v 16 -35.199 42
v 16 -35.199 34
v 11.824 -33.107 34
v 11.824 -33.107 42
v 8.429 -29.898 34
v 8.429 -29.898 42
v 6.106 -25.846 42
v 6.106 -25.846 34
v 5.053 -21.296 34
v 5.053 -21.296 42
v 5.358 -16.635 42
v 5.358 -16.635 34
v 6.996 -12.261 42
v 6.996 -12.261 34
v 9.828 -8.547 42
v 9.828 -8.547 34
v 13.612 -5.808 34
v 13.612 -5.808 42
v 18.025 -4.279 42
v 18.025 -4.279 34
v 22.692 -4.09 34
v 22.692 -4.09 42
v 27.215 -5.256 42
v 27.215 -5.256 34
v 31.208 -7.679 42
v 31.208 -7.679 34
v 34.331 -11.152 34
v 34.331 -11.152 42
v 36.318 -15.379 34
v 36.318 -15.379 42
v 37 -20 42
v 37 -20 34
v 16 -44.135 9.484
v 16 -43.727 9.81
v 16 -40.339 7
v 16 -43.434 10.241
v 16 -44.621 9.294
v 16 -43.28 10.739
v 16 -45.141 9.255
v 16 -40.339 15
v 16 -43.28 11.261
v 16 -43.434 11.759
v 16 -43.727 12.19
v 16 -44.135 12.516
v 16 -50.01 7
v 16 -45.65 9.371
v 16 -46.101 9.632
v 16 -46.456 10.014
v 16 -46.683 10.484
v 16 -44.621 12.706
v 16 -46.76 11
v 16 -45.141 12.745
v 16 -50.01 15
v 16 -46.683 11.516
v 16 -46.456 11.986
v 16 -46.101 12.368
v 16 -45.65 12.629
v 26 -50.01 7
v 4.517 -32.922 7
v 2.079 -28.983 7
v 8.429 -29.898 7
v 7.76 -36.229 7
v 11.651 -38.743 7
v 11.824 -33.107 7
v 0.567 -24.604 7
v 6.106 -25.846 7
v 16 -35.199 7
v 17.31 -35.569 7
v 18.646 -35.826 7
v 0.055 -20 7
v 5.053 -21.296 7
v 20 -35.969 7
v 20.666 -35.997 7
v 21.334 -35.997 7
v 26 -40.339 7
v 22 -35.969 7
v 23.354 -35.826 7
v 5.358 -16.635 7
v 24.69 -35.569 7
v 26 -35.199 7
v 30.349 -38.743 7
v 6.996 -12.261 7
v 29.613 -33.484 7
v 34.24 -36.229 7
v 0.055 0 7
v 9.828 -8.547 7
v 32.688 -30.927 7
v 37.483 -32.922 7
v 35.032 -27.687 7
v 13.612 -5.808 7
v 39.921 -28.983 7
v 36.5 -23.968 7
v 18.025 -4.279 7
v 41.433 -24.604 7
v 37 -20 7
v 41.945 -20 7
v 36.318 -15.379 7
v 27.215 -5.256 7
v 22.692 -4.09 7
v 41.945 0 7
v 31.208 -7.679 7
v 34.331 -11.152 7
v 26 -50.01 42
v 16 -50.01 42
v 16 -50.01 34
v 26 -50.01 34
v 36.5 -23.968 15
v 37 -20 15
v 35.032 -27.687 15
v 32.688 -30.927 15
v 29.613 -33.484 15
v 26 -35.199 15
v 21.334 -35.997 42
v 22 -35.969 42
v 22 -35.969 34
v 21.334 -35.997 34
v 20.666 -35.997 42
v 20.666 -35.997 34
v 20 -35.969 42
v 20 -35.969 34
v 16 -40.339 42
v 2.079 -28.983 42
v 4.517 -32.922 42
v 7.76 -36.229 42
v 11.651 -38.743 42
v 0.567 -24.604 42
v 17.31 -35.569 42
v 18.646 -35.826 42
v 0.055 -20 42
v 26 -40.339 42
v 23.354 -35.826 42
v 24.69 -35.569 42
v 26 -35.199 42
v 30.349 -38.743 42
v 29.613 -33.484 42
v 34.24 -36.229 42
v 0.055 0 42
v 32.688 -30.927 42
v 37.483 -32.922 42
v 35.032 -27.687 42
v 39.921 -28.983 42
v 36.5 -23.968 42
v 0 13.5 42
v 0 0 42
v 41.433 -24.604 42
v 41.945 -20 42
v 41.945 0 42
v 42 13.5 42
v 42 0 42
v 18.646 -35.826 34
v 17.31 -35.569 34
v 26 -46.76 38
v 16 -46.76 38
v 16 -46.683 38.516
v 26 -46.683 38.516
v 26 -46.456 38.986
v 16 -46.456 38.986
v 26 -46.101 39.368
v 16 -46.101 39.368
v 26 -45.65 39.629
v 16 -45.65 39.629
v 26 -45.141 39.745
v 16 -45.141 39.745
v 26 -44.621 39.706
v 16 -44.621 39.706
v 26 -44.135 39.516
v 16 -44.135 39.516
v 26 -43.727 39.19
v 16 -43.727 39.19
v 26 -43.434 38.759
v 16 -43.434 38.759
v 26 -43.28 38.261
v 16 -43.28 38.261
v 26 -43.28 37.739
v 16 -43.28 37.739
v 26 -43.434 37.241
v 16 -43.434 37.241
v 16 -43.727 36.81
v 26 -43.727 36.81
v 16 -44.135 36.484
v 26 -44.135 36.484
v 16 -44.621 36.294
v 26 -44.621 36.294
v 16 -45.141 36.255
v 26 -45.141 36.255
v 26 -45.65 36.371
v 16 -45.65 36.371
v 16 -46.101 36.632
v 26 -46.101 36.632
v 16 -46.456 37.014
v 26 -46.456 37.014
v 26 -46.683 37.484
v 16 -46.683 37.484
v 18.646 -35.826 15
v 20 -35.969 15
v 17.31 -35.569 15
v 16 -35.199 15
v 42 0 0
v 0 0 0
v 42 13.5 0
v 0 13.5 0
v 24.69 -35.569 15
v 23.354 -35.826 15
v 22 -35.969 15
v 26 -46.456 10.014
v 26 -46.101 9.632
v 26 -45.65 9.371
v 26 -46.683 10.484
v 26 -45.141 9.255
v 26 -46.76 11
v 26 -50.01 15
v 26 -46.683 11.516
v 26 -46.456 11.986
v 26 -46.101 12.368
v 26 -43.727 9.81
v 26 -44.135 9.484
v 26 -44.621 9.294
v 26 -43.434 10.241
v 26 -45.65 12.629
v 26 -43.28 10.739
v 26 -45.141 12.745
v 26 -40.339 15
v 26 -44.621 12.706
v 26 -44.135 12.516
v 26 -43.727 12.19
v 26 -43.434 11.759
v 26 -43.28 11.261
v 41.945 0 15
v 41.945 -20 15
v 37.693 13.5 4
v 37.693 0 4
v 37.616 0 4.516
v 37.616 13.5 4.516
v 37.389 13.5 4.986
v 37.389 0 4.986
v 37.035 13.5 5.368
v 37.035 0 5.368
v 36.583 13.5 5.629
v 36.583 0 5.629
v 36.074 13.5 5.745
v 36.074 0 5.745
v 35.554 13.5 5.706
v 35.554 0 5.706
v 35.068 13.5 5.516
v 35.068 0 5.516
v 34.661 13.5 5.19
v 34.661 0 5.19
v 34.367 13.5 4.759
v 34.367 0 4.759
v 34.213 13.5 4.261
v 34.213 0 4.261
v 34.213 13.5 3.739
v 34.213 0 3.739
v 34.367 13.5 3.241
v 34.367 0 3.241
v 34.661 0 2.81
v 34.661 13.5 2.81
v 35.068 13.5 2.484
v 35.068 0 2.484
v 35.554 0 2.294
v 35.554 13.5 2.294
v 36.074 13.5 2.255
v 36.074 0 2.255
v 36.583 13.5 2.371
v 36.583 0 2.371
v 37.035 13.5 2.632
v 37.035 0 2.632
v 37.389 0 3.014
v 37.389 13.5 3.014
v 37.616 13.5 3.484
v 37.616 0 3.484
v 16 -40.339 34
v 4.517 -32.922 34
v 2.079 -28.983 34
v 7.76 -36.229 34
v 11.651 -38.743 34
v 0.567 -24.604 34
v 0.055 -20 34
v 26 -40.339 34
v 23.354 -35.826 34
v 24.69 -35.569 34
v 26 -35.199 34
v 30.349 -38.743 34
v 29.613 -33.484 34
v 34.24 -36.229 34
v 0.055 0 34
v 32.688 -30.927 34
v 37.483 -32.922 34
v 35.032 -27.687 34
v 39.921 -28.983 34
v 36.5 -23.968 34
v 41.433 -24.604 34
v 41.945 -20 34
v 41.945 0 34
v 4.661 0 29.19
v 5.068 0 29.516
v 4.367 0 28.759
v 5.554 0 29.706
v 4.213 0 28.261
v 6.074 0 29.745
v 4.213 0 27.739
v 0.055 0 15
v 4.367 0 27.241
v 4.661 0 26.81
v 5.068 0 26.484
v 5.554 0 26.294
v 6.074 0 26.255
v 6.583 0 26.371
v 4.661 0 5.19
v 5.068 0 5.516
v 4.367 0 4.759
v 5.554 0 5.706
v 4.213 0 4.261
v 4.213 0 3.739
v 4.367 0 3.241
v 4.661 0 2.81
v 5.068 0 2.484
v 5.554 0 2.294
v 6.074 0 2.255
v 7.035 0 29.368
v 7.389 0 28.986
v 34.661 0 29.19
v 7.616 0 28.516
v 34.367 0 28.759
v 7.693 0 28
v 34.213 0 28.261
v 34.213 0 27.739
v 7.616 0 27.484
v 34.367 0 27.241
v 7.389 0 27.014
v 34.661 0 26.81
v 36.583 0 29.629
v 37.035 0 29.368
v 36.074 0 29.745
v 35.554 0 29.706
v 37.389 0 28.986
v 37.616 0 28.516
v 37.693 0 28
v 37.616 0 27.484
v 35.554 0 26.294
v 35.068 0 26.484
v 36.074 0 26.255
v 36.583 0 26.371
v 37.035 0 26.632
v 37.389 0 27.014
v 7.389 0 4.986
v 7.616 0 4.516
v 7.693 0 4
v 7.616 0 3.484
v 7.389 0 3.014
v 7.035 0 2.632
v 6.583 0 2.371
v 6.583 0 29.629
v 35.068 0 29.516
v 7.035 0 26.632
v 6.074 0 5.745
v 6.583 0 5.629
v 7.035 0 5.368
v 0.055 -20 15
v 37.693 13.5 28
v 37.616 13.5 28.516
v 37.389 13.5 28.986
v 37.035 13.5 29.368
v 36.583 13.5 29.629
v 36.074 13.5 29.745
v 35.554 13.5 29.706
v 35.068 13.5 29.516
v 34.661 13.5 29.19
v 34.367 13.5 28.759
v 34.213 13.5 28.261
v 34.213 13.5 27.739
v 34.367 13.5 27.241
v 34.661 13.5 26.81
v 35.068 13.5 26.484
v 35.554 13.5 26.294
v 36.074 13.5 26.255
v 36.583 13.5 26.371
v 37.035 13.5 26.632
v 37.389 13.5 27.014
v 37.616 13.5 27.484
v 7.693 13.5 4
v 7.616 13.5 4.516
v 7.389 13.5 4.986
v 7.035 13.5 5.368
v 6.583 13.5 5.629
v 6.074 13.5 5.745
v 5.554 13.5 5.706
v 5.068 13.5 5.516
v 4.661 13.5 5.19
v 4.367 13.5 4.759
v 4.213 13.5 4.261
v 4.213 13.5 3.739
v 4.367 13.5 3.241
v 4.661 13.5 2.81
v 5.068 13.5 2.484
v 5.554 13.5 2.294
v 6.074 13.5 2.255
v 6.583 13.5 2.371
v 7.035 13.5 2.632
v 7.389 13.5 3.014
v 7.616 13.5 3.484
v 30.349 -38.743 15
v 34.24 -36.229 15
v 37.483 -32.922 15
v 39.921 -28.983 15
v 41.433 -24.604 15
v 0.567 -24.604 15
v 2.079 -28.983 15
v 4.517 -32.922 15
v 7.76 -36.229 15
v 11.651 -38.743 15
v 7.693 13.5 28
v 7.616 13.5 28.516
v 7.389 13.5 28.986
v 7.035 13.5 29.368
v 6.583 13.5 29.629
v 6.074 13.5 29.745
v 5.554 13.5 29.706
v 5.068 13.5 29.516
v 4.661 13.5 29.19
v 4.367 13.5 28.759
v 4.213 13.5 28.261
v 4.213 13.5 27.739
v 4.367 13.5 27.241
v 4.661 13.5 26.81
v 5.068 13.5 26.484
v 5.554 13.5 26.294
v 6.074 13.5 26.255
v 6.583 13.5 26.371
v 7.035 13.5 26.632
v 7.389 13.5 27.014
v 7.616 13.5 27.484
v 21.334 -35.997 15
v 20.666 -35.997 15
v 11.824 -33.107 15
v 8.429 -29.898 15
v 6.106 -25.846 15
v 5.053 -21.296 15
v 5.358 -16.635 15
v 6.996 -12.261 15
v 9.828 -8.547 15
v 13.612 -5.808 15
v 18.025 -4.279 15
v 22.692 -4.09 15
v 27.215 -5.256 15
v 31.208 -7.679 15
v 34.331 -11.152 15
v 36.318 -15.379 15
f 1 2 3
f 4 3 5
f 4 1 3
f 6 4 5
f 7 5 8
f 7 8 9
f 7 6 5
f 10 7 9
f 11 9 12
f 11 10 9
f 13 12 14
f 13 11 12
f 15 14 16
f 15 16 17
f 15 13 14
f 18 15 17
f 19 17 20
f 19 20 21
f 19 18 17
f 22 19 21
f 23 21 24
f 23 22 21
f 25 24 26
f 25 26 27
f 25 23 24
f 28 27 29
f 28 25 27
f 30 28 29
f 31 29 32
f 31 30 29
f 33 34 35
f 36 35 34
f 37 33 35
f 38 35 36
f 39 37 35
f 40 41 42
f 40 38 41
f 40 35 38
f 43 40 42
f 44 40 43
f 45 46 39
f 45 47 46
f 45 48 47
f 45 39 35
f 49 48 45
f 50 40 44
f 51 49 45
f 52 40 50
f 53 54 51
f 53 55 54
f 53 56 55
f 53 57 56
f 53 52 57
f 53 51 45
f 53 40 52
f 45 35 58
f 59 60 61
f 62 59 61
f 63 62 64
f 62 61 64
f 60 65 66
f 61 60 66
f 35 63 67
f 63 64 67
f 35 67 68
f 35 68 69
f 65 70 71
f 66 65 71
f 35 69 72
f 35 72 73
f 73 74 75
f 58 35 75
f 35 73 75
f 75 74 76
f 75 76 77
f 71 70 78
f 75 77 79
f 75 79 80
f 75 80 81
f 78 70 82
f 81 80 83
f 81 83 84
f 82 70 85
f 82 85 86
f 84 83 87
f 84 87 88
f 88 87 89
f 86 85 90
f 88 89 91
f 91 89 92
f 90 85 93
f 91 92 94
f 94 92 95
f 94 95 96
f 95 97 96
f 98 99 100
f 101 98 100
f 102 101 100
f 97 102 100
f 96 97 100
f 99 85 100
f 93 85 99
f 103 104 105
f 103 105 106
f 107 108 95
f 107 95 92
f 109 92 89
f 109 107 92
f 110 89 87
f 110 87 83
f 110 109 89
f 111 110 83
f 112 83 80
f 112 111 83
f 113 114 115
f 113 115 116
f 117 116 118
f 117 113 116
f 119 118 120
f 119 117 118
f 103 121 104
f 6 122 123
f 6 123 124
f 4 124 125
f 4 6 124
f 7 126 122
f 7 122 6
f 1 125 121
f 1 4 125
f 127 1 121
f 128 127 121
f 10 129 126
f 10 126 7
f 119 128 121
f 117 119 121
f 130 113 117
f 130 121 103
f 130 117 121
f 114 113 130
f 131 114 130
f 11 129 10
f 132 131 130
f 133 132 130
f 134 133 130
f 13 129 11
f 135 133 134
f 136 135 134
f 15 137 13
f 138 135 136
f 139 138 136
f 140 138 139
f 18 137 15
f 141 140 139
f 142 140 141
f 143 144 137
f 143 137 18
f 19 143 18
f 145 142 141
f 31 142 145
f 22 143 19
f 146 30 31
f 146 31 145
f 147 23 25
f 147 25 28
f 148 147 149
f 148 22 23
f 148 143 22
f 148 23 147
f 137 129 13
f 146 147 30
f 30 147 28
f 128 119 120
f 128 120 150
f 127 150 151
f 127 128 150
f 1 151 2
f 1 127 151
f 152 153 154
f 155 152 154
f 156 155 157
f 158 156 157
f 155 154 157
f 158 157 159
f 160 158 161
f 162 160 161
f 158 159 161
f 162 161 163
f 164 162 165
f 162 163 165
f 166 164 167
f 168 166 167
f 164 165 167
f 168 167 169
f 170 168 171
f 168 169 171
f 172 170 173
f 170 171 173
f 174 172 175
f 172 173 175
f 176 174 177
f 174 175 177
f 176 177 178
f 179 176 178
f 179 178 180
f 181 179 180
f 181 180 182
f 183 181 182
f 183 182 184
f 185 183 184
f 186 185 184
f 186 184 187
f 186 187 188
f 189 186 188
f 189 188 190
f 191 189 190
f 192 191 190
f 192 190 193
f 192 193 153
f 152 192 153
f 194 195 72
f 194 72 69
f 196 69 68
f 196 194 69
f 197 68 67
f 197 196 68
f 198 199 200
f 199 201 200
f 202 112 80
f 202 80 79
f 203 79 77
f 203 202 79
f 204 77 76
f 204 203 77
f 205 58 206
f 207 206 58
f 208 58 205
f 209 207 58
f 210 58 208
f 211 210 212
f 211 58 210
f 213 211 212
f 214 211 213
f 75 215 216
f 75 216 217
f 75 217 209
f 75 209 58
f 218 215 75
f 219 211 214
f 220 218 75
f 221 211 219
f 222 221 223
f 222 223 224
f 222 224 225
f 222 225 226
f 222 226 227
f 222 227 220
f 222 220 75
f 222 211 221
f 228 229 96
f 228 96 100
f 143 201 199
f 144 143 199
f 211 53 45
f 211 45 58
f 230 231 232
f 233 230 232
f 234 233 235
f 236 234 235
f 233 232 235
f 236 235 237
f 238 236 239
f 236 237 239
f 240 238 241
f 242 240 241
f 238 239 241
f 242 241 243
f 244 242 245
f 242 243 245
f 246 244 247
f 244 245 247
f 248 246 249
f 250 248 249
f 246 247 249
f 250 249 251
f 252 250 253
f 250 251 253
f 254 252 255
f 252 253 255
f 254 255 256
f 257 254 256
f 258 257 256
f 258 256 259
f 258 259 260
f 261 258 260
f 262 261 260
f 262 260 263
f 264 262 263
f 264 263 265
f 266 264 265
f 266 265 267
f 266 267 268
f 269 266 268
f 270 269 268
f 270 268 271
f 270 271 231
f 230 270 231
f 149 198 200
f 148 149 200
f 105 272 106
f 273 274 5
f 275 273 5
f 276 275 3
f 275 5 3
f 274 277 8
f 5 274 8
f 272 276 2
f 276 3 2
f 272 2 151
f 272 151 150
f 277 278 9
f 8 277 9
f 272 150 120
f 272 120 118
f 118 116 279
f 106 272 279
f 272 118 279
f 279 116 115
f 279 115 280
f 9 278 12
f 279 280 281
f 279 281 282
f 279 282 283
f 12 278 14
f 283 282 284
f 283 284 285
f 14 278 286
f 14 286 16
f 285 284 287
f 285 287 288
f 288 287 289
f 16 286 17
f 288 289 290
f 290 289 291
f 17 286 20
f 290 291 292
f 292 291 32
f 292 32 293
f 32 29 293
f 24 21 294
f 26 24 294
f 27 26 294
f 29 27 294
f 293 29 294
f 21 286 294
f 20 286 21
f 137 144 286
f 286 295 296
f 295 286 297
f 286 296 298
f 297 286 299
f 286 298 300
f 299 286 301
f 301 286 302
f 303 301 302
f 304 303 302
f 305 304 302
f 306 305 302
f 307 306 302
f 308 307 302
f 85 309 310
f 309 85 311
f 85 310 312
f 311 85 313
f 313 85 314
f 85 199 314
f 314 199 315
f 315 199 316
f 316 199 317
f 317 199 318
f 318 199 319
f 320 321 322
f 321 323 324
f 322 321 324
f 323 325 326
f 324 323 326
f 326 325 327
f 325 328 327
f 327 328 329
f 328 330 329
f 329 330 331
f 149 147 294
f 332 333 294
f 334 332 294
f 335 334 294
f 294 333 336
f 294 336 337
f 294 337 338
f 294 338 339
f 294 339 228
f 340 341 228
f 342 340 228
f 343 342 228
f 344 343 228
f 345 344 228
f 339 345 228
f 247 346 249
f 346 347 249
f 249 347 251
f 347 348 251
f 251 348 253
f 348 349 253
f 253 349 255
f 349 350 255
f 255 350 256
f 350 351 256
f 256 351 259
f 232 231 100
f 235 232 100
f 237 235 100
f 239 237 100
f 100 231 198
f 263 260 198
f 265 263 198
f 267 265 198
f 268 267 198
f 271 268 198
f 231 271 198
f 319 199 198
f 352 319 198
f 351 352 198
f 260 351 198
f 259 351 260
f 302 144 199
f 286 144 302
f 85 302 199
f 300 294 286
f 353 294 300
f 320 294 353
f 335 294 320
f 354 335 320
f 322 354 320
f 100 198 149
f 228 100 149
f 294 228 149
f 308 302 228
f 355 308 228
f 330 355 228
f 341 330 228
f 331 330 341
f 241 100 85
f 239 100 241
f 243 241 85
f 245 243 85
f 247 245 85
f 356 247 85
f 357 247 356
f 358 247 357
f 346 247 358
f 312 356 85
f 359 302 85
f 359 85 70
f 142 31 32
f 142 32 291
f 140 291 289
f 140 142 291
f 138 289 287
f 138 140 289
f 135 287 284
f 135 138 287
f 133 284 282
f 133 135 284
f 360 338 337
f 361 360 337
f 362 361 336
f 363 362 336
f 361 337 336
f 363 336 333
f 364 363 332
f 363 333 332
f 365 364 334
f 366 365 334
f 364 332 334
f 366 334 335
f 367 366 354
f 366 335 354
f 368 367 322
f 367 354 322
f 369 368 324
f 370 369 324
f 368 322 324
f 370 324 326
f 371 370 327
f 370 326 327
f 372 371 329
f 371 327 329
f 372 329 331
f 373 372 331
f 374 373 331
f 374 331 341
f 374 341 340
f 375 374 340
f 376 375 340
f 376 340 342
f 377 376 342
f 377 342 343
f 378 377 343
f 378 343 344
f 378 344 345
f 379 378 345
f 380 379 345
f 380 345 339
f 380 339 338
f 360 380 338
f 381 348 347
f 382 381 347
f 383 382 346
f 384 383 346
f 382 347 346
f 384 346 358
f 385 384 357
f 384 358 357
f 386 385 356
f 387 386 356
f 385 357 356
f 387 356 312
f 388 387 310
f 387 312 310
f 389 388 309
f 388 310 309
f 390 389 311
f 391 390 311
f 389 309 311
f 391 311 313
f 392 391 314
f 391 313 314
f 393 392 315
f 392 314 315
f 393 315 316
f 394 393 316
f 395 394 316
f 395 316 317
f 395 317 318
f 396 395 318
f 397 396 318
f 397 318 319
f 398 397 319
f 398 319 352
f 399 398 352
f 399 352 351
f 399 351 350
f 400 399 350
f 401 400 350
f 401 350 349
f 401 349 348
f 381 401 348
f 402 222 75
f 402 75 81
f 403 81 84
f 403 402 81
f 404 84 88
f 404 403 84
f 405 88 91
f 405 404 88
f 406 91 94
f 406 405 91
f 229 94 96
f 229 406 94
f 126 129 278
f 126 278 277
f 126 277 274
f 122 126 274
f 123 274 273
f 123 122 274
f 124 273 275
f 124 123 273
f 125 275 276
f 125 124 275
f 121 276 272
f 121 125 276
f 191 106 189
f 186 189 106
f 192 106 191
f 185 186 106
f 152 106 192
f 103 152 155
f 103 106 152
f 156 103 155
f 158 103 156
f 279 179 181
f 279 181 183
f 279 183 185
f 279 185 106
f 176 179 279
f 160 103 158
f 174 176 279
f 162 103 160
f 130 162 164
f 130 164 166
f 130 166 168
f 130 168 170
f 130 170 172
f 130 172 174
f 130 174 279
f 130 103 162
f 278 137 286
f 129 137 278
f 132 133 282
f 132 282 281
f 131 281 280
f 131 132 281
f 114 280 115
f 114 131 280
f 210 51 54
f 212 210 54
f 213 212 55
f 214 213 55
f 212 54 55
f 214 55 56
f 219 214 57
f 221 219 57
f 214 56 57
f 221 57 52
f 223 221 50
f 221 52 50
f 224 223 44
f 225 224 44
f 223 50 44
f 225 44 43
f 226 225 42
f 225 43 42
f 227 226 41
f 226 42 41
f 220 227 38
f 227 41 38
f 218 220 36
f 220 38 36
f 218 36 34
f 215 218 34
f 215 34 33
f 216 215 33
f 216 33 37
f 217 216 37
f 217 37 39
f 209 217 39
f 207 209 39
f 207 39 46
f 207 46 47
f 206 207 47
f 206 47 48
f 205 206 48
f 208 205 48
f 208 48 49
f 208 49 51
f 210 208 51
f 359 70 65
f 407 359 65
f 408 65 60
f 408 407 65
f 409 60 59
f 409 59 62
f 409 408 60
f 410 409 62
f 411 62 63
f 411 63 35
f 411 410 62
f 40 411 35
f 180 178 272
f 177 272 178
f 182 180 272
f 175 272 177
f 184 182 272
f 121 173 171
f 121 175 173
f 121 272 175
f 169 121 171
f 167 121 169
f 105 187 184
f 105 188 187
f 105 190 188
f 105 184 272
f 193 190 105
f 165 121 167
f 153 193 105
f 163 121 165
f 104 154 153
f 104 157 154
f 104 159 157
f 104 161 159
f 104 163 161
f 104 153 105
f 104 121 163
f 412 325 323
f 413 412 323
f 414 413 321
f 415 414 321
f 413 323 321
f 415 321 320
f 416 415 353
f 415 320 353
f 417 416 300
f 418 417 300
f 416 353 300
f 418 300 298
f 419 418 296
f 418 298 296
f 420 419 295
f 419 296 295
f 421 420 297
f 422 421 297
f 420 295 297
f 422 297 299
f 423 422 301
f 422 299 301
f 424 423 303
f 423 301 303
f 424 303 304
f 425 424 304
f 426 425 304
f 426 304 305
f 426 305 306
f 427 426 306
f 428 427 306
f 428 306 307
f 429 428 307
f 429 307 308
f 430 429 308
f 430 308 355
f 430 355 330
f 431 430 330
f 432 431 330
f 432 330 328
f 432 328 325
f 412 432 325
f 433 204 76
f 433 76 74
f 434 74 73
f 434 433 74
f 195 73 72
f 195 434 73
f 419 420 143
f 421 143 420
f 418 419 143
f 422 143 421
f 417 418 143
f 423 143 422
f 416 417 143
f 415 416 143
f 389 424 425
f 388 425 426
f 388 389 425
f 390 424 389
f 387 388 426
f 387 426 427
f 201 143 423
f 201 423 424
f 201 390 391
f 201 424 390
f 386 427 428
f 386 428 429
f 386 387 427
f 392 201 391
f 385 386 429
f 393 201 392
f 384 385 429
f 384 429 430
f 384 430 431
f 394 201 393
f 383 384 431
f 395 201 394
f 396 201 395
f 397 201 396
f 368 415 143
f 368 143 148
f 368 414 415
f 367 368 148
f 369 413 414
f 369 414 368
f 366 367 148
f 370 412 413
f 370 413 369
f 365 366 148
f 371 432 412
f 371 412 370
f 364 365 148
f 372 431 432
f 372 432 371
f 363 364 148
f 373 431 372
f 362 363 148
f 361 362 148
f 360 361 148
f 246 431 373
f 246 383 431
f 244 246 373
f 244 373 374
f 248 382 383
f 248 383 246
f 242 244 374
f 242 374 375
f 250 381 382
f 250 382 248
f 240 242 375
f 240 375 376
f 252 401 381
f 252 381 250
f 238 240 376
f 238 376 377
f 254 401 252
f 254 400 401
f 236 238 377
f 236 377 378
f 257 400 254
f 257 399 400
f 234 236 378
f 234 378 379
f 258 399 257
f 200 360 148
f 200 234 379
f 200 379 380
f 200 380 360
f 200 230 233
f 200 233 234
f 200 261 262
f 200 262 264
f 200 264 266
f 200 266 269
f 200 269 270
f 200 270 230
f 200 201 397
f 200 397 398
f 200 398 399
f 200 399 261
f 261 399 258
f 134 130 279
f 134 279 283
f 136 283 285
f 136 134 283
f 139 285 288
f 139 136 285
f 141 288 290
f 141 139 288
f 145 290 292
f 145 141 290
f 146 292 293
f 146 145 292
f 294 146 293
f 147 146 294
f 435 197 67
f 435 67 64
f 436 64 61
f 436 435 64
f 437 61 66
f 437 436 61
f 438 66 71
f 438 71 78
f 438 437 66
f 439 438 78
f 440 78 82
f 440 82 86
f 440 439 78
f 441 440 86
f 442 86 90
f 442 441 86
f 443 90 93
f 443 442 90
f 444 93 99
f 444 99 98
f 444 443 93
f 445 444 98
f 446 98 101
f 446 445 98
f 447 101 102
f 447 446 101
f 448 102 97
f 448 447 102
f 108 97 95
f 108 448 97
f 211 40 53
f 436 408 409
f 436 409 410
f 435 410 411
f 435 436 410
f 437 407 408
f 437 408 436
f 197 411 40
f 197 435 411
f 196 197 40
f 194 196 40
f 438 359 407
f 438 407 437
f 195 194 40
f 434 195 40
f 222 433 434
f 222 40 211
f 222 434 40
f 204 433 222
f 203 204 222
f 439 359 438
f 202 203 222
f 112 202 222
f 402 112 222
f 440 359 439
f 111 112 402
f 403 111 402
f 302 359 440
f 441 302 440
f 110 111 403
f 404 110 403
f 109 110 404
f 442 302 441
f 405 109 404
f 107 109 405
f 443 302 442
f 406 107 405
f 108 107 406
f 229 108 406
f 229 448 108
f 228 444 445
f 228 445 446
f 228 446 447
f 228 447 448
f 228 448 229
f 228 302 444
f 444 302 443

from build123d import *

# Parameters (mm, degrees)
F0_W     = 42
F0_H     = 10
F0_H_2   = 3.5
F1_DEPTH = 42
F2_R     = 1.75
F3_DEPTH = 25
F5_DEPTH = 8
F6_START = -27
F6_DEPTH = 8
F7_R     = 1.75
F8_DEPTH = 25


with BuildPart() as f1:
    # F0 (on Top) → F1 (new body)
    with BuildSketch(Plane.XY):
        with Locations((21, 5)):
            Rectangle(F0_W, F0_H)
        with Locations((21, 11.75)):
            Rectangle(F0_W, F0_H_2)
    extrude(amount=F1_DEPTH)

    # F2 (on face) → F3 (cut)
    with BuildSketch(Plane.XZ):
        with Locations((5.9434068862, 28)):
            Circle(F2_R)
        with Locations((5.9434068862, 4)):
            Circle(F2_R)
        with Locations((35.9434068862, 4)):
            Circle(F2_R)
        with Locations((35.9434068862, 28)):
            Circle(F2_R)
    extrude(amount=-F3_DEPTH, mode=Mode.SUBTRACT)

    # F4 (on face) → F5 (join)
    with BuildSketch(Plane.XY.offset(42)):
        with BuildLine():
            ThreePointArc((16, -35.1986841536), (11.6191684804, -7.0385186032), (37, -20))
            ThreePointArc((37, -20), (33.9614813968, -29.3808315196), (26, -35.1986841536))
            Line((26, -35.1986841536), (26, -40.33927218))
            ThreePointArc((26, -40.33927218), (37.4834789023, -32.9221095835), (41.9448321266, -20))
            ThreePointArc((41.9448321266, -20), (37.8665170629, -7.582005195), (27.219806493, 0))
            Line((27.219806493, 0), (14.780193507, 0))
            ThreePointArc((14.780193507, 0), (4.1334829371, -7.582005195), (0.0551678734, -20))
            ThreePointArc((0.0551678734, -20), (4.5165210977, -32.9221095835), (16, -40.33927218))
            Line((16, -40.33927218), (16, -35.1986841536))
        make_face()
        with BuildLine():
            Line((26, -40.33927218), (26, -35.1986841536))
            ThreePointArc((26, -35.1986841536), (24.0246055245, -35.7115168402), (22, -35.9687194227))
            Line((22, -35.9687194227), (22, -40.9209462695))
            ThreePointArc((22, -40.9209462695), (24.0140647283, -40.7268281853), (26, -40.33927218))
        make_face()
        with BuildLine():
            Line((26, -50.0102601945), (26, -40.33927218))
            ThreePointArc((26, -40.33927218), (24.0140647283, -40.7268281853), (22, -40.9209462695))
            Line((22, -40.9209462695), (22, -50.0102601945))
            Line((22, -50.0102601945), (26, -50.0102601945))
        make_face()
        with BuildLine():
            ThreePointArc((20, -40.9209462695), (17.9859352717, -40.7268281853), (16, -40.33927218))
            Line((16, -40.33927218), (16, -50.0102601945))
            Line((16, -50.0102601945), (20, -50.0102601945))
            Line((20, -50.0102601945), (20, -40.9209462695))
        make_face()
        with BuildLine():
            ThreePointArc((20, -35.9687194227), (17.9753944755, -35.7115168402), (16, -35.1986841536))
            Line((16, -35.1986841536), (16, -40.33927218))
            ThreePointArc((16, -40.33927218), (17.9859352717, -40.7268281853), (20, -40.9209462695))
            Line((20, -40.9209462695), (20, -35.9687194227))
        make_face()
        with BuildLine():
            ThreePointArc((22, -35.9687194227), (21, -36), (20, -35.9687194227))
            Line((20, -35.9687194227), (20, -40.9209462695))
            ThreePointArc((20, -40.9209462695), (21, -40.9448321266), (22, -40.9209462695))
            Line((22, -40.9209462695), (22, -35.9687194227))
        make_face()
        with BuildLine():
            ThreePointArc((22, -40.9209462695), (21, -40.9448321266), (20, -40.9209462695))
            Line((20, -40.9209462695), (20, -50.0102601945))
            Line((20, -50.0102601945), (22, -50.0102601945))
            Line((22, -50.0102601945), (22, -40.9209462695))
        make_face()
        with BuildLine():
            Line((0.0551678734, 0), (0.0551678734, -20))
            ThreePointArc((0.0551678734, -20), (4.1334829371, -7.582005195), (14.780193507, 0))
            Line((14.780193507, 0), (0.0551678734, 0))
        make_face()
        with BuildLine():
            ThreePointArc((27.219806493, 0), (37.8665170629, -7.582005195), (41.9448321266, -20))
            Line((41.9448321266, -20), (41.9448321266, 0))
            Line((41.9448321266, 0), (27.219806493, 0))
        make_face()
    extrude(amount=-F5_DEPTH)

    # F4 (on face) → F6 (join)
    with BuildSketch(Plane.XY.offset(42).offset(F6_START)):
        with BuildLine():
            ThreePointArc((16, -35.1986841536), (11.6191684804, -7.0385186032), (37, -20))
            ThreePointArc((37, -20), (33.9614813968, -29.3808315196), (26, -35.1986841536))
            Line((26, -35.1986841536), (26, -40.33927218))
            ThreePointArc((26, -40.33927218), (37.4834789023, -32.9221095835), (41.9448321266, -20))
            ThreePointArc((41.9448321266, -20), (37.8665170629, -7.582005195), (27.219806493, 0))
            Line((27.219806493, 0), (14.780193507, 0))
            ThreePointArc((14.780193507, 0), (4.1334829371, -7.582005195), (0.0551678734, -20))
            ThreePointArc((0.0551678734, -20), (4.5165210977, -32.9221095835), (16, -40.33927218))
            Line((16, -40.33927218), (16, -35.1986841536))
        make_face()
        with BuildLine():
            ThreePointArc((20, -35.9687194227), (17.9753944755, -35.7115168402), (16, -35.1986841536))
            Line((16, -35.1986841536), (16, -40.33927218))
            ThreePointArc((16, -40.33927218), (17.9859352717, -40.7268281853), (20, -40.9209462695))
            Line((20, -40.9209462695), (20, -35.9687194227))
        make_face()
        with BuildLine():
            ThreePointArc((20, -40.9209462695), (17.9859352717, -40.7268281853), (16, -40.33927218))
            Line((16, -40.33927218), (16, -50.0102601945))
            Line((16, -50.0102601945), (20, -50.0102601945))
            Line((20, -50.0102601945), (20, -40.9209462695))
        make_face()
        with BuildLine():
            Line((26, -50.0102601945), (26, -40.33927218))
            ThreePointArc((26, -40.33927218), (24.0140647283, -40.7268281853), (22, -40.9209462695))
            Line((22, -40.9209462695), (22, -50.0102601945))
            Line((22, -50.0102601945), (26, -50.0102601945))
        make_face()
        with BuildLine():
            Line((26, -40.33927218), (26, -35.1986841536))
            ThreePointArc((26, -35.1986841536), (24.0246055245, -35.7115168402), (22, -35.9687194227))
            Line((22, -35.9687194227), (22, -40.9209462695))
            ThreePointArc((22, -40.9209462695), (24.0140647283, -40.7268281853), (26, -40.33927218))
        make_face()
        with BuildLine():
            ThreePointArc((22, -40.9209462695), (21, -40.9448321266), (20, -40.9209462695))
            Line((20, -40.9209462695), (20, -50.0102601945))
            Line((20, -50.0102601945), (22, -50.0102601945))
            Line((22, -50.0102601945), (22, -40.9209462695))
        make_face()
        with BuildLine():
            ThreePointArc((22, -35.9687194227), (21, -36), (20, -35.9687194227))
            Line((20, -35.9687194227), (20, -40.9209462695))
            ThreePointArc((20, -40.9209462695), (21, -40.9448321266), (22, -40.9209462695))
            Line((22, -40.9209462695), (22, -35.9687194227))
        make_face()
        with BuildLine():
            Line((0.0551678734, 0), (0.0551678734, -20))
            ThreePointArc((0.0551678734, -20), (4.1334829371, -7.582005195), (14.780193507, 0))
            Line((14.780193507, 0), (0.0551678734, 0))
        make_face()
        with BuildLine():
            ThreePointArc((27.219806493, 0), (37.8665170629, -7.582005195), (41.9448321266, -20))
            Line((41.9448321266, -20), (41.9448321266, 0))
            Line((41.9448321266, 0), (27.219806493, 0))
        make_face()
    extrude(amount=-F6_DEPTH)

    # F7 (on face) → F8 (cut)
    with BuildSketch(Plane(origin=(16, 0, 0), x_dir=(0, -1, 0), z_dir=(-1, 0, 0))):
        with Locations((45.0102601945, 38)):
            Circle(F7_R)
        with Locations((45.0102601945, 11)):
            Circle(F7_R)
    extrude(amount=-F8_DEPTH, mode=Mode.SUBTRACT)


solid = f1.part
